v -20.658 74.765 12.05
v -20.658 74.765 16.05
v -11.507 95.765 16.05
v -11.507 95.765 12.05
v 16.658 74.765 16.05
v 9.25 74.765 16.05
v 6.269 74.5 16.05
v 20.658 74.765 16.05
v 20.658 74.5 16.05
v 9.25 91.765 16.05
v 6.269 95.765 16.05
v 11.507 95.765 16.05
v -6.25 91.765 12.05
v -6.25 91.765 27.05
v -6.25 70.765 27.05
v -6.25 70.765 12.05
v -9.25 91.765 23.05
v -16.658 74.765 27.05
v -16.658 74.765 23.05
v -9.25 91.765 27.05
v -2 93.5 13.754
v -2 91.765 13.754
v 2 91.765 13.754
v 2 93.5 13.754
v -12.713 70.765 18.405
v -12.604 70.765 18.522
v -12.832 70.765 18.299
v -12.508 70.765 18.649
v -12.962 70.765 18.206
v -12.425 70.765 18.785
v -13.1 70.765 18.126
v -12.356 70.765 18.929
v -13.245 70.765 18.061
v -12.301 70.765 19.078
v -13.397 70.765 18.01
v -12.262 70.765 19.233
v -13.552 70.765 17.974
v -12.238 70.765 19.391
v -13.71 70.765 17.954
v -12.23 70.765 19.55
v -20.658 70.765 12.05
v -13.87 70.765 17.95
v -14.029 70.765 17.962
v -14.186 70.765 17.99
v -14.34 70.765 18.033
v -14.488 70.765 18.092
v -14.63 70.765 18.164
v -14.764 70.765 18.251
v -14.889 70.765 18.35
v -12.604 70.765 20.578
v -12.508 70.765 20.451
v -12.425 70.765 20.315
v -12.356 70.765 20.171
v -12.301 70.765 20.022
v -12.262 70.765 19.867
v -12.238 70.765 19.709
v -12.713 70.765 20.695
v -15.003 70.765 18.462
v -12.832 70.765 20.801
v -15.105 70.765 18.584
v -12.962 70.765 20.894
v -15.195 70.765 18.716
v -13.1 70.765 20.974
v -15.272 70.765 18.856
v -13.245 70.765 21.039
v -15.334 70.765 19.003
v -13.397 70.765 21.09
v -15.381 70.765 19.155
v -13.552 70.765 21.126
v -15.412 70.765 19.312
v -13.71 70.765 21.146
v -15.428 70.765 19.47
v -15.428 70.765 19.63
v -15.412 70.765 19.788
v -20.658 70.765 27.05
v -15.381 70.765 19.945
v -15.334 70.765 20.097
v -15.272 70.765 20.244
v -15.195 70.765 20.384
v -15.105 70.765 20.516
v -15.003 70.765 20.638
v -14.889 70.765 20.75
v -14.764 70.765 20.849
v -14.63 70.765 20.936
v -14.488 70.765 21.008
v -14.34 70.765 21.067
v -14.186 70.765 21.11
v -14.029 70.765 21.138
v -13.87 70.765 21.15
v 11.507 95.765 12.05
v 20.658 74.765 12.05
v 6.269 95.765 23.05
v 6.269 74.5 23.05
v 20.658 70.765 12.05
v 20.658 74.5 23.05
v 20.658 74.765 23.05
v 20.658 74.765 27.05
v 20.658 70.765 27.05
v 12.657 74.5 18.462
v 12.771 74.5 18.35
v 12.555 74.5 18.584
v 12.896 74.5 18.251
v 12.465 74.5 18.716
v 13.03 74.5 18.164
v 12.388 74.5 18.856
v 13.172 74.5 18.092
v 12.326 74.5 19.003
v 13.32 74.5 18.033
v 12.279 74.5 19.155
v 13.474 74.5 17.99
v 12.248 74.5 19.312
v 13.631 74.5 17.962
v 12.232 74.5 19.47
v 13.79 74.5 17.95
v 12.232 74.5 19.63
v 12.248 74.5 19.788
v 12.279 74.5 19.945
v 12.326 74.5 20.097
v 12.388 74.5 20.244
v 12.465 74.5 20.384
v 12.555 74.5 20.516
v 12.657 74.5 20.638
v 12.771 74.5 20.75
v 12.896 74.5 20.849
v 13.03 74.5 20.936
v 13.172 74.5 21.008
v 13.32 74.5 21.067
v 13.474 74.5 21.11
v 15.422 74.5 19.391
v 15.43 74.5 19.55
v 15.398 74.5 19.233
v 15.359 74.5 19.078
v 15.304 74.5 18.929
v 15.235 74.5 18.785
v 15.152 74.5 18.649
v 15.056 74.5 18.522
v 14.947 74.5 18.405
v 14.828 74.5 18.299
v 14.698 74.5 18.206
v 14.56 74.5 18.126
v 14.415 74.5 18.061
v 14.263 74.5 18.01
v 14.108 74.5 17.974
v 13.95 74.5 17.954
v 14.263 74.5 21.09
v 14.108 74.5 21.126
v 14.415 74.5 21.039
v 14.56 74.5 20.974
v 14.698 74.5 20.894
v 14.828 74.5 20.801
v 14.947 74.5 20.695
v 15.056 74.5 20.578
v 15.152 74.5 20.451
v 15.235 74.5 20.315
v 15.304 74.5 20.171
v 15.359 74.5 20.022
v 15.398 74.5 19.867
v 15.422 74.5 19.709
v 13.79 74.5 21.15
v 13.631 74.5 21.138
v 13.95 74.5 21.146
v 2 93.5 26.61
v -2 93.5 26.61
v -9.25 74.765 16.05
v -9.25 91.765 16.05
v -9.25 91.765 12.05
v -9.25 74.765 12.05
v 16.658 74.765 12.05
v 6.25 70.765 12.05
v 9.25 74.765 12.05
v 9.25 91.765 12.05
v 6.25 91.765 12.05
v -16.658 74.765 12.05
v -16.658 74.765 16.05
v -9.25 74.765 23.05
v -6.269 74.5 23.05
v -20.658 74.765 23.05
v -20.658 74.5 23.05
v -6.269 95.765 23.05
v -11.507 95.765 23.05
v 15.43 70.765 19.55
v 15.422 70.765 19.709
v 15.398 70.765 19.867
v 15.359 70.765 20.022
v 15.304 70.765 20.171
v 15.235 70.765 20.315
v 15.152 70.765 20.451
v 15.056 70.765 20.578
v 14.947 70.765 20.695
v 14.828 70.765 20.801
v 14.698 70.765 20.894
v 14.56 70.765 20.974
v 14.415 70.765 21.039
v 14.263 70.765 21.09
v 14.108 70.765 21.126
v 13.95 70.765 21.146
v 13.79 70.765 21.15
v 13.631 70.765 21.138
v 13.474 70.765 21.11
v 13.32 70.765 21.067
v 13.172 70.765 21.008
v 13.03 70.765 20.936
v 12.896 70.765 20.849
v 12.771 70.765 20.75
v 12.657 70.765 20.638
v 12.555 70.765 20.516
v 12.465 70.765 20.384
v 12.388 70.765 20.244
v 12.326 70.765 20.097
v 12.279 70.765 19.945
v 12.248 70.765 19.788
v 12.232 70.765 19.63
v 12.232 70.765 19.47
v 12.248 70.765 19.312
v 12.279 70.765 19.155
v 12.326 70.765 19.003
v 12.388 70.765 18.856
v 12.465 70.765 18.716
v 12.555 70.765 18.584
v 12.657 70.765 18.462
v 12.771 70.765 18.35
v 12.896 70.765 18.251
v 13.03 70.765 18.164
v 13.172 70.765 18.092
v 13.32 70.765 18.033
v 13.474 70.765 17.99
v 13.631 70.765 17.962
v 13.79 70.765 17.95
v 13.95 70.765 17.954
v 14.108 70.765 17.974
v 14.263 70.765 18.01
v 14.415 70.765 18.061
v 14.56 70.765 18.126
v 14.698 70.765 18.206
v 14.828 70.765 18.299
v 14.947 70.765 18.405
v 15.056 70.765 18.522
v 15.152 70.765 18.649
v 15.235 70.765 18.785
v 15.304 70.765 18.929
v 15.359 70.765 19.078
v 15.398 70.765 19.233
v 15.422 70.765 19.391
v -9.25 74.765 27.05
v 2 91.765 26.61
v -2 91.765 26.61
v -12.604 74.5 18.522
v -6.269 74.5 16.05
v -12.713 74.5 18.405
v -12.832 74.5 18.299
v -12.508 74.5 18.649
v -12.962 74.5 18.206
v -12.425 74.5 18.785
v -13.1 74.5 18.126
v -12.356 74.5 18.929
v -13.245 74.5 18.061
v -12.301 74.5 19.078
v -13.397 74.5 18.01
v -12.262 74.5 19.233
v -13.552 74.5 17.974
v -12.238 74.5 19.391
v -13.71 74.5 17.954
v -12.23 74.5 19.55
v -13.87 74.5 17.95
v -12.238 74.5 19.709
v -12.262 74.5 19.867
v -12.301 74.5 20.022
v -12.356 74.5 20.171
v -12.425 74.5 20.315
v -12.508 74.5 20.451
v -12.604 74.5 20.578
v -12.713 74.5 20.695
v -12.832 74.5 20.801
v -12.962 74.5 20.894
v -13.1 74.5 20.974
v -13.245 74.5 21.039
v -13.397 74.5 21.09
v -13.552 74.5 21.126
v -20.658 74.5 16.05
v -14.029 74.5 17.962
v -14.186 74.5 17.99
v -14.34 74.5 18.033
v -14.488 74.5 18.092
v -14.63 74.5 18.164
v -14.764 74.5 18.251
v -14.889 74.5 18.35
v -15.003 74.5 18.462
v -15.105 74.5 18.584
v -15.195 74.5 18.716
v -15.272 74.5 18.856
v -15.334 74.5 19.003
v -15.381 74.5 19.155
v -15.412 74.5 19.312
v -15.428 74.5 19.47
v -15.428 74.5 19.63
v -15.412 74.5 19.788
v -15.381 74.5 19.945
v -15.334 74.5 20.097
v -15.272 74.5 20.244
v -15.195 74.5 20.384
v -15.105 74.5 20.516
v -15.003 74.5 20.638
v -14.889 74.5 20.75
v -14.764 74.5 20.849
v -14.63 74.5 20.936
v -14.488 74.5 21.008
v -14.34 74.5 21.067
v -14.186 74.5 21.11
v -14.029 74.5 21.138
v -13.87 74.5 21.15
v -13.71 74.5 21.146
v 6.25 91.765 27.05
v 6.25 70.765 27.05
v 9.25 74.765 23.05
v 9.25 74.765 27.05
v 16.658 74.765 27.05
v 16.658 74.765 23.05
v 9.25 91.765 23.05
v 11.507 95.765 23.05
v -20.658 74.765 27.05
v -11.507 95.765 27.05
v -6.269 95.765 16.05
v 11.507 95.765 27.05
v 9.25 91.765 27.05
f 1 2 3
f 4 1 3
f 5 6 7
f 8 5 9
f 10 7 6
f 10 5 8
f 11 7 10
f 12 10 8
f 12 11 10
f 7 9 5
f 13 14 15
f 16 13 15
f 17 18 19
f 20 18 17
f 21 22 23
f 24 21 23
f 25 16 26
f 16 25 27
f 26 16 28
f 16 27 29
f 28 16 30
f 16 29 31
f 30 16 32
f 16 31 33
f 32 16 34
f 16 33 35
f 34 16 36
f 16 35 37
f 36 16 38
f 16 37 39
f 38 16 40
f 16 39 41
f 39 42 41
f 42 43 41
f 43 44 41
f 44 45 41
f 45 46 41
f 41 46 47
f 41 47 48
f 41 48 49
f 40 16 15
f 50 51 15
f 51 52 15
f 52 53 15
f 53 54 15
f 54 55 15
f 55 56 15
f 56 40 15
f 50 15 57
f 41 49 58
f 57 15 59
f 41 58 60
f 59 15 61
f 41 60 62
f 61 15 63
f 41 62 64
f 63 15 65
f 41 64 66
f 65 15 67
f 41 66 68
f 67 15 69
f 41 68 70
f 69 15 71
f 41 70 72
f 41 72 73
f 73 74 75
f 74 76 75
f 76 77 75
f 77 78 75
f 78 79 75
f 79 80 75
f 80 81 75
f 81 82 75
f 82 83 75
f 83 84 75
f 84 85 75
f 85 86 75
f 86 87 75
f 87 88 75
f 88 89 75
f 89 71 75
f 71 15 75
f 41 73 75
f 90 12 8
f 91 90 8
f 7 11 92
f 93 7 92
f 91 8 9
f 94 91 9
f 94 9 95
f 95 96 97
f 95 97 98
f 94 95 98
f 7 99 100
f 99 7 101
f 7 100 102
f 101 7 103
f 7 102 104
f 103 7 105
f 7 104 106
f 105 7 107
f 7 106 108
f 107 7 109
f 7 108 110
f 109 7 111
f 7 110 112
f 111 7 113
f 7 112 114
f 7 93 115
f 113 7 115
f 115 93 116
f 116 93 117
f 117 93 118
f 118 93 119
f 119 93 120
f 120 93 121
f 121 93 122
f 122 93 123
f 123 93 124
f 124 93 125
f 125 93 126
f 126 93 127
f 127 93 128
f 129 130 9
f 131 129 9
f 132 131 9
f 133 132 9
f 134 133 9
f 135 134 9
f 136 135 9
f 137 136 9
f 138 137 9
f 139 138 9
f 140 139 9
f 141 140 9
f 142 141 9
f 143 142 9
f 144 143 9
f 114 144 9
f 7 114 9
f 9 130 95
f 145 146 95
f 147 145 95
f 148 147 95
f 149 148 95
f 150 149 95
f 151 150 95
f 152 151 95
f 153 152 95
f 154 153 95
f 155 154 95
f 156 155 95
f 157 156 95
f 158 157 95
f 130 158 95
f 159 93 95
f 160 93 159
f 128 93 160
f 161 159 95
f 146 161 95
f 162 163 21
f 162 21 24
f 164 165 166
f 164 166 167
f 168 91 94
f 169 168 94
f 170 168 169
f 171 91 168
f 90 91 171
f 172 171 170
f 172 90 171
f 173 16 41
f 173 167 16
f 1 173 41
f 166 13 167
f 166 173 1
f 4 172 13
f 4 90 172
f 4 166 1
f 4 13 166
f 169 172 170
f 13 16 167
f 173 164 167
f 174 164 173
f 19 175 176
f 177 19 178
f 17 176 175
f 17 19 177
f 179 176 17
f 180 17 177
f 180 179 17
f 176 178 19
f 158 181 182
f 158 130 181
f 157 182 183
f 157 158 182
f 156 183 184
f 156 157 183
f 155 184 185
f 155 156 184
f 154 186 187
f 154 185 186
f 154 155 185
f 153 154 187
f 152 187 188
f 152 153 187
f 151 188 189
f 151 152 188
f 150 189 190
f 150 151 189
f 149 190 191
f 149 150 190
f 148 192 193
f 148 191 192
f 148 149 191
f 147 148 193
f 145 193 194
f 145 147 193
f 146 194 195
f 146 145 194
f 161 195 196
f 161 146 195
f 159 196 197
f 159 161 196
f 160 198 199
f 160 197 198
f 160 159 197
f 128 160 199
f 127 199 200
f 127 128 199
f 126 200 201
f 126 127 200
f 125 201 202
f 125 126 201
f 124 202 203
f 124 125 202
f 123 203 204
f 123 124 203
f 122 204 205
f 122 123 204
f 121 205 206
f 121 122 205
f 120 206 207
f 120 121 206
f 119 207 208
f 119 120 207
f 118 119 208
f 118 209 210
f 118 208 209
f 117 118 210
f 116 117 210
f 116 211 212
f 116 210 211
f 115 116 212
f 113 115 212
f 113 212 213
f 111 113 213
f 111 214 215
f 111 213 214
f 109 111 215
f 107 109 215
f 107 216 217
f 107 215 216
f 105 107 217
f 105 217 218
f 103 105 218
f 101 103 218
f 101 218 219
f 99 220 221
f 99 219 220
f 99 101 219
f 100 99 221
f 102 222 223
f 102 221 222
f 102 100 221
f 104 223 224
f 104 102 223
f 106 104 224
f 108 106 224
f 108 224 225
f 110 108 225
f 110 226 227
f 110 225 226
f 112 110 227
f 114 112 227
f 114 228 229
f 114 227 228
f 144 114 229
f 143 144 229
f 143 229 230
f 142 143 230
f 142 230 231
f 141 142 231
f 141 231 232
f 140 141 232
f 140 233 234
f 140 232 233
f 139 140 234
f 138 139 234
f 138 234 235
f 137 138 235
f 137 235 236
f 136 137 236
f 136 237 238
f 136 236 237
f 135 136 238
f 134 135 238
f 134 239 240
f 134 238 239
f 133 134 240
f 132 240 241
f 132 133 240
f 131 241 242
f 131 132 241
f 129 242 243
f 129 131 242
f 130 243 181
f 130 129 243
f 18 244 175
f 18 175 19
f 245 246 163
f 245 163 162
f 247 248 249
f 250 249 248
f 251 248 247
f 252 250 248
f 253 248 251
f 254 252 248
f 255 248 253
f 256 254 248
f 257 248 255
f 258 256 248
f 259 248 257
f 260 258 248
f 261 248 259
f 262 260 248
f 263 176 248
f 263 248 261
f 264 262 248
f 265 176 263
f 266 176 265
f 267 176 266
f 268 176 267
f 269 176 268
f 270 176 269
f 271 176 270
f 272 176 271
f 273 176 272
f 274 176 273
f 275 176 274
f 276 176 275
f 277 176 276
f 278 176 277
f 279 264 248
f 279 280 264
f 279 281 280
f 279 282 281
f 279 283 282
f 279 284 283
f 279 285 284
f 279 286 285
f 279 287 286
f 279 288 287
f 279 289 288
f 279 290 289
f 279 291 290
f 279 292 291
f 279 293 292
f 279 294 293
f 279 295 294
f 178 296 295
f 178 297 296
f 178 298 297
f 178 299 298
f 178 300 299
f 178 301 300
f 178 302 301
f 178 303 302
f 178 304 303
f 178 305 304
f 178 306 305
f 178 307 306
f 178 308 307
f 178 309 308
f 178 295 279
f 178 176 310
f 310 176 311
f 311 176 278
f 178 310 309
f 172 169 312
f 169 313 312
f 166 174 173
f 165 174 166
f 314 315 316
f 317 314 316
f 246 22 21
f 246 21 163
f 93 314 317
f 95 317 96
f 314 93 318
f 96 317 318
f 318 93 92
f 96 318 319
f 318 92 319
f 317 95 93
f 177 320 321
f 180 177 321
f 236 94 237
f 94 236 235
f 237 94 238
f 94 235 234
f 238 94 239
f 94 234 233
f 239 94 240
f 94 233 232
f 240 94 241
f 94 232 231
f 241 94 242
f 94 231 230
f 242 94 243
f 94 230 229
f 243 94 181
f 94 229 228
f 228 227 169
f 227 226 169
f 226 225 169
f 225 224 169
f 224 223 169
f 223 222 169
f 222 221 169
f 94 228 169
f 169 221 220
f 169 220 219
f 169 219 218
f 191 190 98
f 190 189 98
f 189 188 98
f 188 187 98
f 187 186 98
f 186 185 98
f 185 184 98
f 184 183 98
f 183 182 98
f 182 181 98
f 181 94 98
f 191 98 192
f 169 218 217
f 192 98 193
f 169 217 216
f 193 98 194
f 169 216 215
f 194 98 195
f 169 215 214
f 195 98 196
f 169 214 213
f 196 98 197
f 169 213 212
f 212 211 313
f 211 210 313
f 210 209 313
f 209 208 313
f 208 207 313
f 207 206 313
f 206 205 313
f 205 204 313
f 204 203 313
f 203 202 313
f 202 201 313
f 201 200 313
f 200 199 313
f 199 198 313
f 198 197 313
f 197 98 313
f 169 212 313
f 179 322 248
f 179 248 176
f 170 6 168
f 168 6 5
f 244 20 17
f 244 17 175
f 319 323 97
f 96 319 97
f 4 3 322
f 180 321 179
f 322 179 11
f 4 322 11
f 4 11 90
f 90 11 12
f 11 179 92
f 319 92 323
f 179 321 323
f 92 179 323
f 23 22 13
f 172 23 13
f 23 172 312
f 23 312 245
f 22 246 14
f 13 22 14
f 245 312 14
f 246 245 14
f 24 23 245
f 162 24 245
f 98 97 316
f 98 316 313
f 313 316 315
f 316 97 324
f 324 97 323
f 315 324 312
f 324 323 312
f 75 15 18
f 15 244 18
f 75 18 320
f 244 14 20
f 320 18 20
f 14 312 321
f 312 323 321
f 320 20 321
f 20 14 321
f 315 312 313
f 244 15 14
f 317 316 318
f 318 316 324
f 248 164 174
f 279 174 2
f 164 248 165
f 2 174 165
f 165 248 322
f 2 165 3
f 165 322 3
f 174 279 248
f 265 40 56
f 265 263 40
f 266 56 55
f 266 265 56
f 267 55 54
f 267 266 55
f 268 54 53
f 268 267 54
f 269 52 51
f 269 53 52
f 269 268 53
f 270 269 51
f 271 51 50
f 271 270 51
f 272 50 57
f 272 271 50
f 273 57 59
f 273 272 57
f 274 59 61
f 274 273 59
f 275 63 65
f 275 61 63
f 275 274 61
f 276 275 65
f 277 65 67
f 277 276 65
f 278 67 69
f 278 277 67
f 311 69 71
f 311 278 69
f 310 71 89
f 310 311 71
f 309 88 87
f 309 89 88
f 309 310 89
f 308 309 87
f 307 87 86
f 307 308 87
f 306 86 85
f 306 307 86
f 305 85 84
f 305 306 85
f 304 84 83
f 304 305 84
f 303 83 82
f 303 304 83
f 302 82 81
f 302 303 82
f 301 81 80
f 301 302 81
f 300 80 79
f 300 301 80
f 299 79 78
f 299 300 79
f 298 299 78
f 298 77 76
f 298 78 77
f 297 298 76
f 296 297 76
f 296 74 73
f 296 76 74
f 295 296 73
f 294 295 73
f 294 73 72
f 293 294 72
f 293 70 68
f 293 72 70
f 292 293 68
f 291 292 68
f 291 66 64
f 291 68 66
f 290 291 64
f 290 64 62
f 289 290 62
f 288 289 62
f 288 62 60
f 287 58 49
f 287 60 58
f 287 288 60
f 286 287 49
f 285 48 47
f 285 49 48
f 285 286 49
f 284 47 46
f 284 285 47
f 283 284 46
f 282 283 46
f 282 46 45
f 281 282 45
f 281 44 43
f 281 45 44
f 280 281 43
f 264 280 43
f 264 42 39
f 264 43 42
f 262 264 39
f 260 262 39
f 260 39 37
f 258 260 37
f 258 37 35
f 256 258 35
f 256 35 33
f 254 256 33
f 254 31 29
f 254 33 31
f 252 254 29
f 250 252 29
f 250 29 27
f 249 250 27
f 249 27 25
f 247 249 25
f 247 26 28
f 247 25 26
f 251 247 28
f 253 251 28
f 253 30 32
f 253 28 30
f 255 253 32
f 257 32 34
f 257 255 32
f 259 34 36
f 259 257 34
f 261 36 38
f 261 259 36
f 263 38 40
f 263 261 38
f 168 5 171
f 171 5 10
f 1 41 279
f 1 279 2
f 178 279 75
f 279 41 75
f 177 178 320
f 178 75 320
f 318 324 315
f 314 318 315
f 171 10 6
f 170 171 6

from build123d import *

# Parameters (mm, degrees)
PAD024_DEPTH       = 7.5
SKETCH062_W        = 16.391504
SKETCH062_H        = 7
POCKET003023_DEPTH = 22
SKETCH060_R        = 1.6
POCKET003024_DEPTH = 5.735743
SKETCH063_W        = 4
SKETCH063_H        = 12.856441
POCKET003025_DEPTH = 2


with BuildPart() as part:
    # Sketch061 → Pad024 (new body, symmetric)
    with BuildSketch(Plane.XY.offset(19.55)):
        Polygon((-11.506902, 93.265257), (11.506902, 93.265257), (20.658167, 72.265257), (20.658167, 68.265257), (6.25, 68.265257), (6.25, 89.265257), (-6.25, 89.265257), (-6.25, 68.265257), (-20.658167, 68.265257), (-20.658167, 72.265257), align=None)
        Polygon((-9.25, 72.265257), (-16.658167, 72.265257), (-9.25, 89.265257), align=None, mode=Mode.SUBTRACT)
        Polygon((9.25, 89.265257), (9.25, 72.265257), (16.658167, 72.265257), align=None, mode=Mode.SUBTRACT)
    extrude(amount=PAD024_DEPTH, both=True)

    # Sketch062 → Pocket003023 (cut)
    with BuildSketch(Plane.XZ.offset(-94)):
        with Locations((14.465183, 19.55)):
            Rectangle(SKETCH062_W, SKETCH062_H)
    pocket003023 = extrude(amount=POCKET003023_DEPTH, mode=Mode.SUBTRACT)

    # Mirrored003: Pocket003023 across Sketch062 V_Axis
    add(pocket003023.mirror(Plane(origin=(0, 94, 0), x_dir=(0, -1, 0), z_dir=(1, 0, 0))), mode=Mode.SUBTRACT)

    # Sketch060 → Pocket003024 (cut, through all)
    with BuildSketch(Plane.XZ.offset(-74)):
        with Locations((-13.83, 19.55)):
            Circle(SKETCH060_R)
        with Locations((13.83, 19.55)):
            Circle(SKETCH060_R)
    extrude(amount=POCKET003024_DEPTH, mode=Mode.SUBTRACT)

    # Sketch063 → Pocket003025 (cut)
    with BuildSketch(Plane.XZ.offset(-89)):
        with Locations((0, 20.182275)):
            Rectangle(SKETCH063_W, SKETCH063_H)
    extrude(amount=-POCKET003025_DEPTH, mode=Mode.SUBTRACT)


with BuildPart() as part_1:
    # Body012 placement: moved
    add(part.part.moved(Location((0, 2.5, 0))))


solid = part_1.part
